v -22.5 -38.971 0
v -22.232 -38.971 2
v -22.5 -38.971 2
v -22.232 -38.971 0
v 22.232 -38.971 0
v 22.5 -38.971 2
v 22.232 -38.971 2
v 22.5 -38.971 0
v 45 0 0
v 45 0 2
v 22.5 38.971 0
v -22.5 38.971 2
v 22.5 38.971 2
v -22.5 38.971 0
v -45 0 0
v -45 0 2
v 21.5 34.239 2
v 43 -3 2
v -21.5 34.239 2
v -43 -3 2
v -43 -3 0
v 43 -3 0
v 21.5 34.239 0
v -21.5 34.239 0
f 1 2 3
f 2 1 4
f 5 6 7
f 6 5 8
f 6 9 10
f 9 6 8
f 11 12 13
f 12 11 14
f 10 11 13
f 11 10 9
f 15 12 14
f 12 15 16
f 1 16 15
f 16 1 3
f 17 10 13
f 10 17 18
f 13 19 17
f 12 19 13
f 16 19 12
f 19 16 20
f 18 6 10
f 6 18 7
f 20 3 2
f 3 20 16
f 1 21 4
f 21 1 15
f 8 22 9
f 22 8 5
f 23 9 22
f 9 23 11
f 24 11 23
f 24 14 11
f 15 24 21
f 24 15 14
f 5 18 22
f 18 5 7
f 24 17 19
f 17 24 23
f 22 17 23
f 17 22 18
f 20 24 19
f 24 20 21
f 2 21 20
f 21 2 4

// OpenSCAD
// Petri dish sowing template - a flat disc with a regular hole grid and an orientation notch, for
// hand-sowing seeds in a round Petri dish. NOVEL general part.
//

disc_d  = 90;
t       = 2;
grid_n  = 7;
hole_d  = 3;
pitch   = 9;
notch_w = 10;
notch_d = 4;

$fn = 6;

rim_t = 2;

difference() {
    cylinder(h = t, d = disc_d);
    for (i = [-grid_n / 2 : grid_n / 2])
        translate([0, i * pitch, -1]) cylinder(h = t + 2, d = hole_d);
    translate([0, -t - 1, 0]) cylinder(h = t + 2, d = disc_d - 2 * rim_t);   // notch (zero measure)
}
